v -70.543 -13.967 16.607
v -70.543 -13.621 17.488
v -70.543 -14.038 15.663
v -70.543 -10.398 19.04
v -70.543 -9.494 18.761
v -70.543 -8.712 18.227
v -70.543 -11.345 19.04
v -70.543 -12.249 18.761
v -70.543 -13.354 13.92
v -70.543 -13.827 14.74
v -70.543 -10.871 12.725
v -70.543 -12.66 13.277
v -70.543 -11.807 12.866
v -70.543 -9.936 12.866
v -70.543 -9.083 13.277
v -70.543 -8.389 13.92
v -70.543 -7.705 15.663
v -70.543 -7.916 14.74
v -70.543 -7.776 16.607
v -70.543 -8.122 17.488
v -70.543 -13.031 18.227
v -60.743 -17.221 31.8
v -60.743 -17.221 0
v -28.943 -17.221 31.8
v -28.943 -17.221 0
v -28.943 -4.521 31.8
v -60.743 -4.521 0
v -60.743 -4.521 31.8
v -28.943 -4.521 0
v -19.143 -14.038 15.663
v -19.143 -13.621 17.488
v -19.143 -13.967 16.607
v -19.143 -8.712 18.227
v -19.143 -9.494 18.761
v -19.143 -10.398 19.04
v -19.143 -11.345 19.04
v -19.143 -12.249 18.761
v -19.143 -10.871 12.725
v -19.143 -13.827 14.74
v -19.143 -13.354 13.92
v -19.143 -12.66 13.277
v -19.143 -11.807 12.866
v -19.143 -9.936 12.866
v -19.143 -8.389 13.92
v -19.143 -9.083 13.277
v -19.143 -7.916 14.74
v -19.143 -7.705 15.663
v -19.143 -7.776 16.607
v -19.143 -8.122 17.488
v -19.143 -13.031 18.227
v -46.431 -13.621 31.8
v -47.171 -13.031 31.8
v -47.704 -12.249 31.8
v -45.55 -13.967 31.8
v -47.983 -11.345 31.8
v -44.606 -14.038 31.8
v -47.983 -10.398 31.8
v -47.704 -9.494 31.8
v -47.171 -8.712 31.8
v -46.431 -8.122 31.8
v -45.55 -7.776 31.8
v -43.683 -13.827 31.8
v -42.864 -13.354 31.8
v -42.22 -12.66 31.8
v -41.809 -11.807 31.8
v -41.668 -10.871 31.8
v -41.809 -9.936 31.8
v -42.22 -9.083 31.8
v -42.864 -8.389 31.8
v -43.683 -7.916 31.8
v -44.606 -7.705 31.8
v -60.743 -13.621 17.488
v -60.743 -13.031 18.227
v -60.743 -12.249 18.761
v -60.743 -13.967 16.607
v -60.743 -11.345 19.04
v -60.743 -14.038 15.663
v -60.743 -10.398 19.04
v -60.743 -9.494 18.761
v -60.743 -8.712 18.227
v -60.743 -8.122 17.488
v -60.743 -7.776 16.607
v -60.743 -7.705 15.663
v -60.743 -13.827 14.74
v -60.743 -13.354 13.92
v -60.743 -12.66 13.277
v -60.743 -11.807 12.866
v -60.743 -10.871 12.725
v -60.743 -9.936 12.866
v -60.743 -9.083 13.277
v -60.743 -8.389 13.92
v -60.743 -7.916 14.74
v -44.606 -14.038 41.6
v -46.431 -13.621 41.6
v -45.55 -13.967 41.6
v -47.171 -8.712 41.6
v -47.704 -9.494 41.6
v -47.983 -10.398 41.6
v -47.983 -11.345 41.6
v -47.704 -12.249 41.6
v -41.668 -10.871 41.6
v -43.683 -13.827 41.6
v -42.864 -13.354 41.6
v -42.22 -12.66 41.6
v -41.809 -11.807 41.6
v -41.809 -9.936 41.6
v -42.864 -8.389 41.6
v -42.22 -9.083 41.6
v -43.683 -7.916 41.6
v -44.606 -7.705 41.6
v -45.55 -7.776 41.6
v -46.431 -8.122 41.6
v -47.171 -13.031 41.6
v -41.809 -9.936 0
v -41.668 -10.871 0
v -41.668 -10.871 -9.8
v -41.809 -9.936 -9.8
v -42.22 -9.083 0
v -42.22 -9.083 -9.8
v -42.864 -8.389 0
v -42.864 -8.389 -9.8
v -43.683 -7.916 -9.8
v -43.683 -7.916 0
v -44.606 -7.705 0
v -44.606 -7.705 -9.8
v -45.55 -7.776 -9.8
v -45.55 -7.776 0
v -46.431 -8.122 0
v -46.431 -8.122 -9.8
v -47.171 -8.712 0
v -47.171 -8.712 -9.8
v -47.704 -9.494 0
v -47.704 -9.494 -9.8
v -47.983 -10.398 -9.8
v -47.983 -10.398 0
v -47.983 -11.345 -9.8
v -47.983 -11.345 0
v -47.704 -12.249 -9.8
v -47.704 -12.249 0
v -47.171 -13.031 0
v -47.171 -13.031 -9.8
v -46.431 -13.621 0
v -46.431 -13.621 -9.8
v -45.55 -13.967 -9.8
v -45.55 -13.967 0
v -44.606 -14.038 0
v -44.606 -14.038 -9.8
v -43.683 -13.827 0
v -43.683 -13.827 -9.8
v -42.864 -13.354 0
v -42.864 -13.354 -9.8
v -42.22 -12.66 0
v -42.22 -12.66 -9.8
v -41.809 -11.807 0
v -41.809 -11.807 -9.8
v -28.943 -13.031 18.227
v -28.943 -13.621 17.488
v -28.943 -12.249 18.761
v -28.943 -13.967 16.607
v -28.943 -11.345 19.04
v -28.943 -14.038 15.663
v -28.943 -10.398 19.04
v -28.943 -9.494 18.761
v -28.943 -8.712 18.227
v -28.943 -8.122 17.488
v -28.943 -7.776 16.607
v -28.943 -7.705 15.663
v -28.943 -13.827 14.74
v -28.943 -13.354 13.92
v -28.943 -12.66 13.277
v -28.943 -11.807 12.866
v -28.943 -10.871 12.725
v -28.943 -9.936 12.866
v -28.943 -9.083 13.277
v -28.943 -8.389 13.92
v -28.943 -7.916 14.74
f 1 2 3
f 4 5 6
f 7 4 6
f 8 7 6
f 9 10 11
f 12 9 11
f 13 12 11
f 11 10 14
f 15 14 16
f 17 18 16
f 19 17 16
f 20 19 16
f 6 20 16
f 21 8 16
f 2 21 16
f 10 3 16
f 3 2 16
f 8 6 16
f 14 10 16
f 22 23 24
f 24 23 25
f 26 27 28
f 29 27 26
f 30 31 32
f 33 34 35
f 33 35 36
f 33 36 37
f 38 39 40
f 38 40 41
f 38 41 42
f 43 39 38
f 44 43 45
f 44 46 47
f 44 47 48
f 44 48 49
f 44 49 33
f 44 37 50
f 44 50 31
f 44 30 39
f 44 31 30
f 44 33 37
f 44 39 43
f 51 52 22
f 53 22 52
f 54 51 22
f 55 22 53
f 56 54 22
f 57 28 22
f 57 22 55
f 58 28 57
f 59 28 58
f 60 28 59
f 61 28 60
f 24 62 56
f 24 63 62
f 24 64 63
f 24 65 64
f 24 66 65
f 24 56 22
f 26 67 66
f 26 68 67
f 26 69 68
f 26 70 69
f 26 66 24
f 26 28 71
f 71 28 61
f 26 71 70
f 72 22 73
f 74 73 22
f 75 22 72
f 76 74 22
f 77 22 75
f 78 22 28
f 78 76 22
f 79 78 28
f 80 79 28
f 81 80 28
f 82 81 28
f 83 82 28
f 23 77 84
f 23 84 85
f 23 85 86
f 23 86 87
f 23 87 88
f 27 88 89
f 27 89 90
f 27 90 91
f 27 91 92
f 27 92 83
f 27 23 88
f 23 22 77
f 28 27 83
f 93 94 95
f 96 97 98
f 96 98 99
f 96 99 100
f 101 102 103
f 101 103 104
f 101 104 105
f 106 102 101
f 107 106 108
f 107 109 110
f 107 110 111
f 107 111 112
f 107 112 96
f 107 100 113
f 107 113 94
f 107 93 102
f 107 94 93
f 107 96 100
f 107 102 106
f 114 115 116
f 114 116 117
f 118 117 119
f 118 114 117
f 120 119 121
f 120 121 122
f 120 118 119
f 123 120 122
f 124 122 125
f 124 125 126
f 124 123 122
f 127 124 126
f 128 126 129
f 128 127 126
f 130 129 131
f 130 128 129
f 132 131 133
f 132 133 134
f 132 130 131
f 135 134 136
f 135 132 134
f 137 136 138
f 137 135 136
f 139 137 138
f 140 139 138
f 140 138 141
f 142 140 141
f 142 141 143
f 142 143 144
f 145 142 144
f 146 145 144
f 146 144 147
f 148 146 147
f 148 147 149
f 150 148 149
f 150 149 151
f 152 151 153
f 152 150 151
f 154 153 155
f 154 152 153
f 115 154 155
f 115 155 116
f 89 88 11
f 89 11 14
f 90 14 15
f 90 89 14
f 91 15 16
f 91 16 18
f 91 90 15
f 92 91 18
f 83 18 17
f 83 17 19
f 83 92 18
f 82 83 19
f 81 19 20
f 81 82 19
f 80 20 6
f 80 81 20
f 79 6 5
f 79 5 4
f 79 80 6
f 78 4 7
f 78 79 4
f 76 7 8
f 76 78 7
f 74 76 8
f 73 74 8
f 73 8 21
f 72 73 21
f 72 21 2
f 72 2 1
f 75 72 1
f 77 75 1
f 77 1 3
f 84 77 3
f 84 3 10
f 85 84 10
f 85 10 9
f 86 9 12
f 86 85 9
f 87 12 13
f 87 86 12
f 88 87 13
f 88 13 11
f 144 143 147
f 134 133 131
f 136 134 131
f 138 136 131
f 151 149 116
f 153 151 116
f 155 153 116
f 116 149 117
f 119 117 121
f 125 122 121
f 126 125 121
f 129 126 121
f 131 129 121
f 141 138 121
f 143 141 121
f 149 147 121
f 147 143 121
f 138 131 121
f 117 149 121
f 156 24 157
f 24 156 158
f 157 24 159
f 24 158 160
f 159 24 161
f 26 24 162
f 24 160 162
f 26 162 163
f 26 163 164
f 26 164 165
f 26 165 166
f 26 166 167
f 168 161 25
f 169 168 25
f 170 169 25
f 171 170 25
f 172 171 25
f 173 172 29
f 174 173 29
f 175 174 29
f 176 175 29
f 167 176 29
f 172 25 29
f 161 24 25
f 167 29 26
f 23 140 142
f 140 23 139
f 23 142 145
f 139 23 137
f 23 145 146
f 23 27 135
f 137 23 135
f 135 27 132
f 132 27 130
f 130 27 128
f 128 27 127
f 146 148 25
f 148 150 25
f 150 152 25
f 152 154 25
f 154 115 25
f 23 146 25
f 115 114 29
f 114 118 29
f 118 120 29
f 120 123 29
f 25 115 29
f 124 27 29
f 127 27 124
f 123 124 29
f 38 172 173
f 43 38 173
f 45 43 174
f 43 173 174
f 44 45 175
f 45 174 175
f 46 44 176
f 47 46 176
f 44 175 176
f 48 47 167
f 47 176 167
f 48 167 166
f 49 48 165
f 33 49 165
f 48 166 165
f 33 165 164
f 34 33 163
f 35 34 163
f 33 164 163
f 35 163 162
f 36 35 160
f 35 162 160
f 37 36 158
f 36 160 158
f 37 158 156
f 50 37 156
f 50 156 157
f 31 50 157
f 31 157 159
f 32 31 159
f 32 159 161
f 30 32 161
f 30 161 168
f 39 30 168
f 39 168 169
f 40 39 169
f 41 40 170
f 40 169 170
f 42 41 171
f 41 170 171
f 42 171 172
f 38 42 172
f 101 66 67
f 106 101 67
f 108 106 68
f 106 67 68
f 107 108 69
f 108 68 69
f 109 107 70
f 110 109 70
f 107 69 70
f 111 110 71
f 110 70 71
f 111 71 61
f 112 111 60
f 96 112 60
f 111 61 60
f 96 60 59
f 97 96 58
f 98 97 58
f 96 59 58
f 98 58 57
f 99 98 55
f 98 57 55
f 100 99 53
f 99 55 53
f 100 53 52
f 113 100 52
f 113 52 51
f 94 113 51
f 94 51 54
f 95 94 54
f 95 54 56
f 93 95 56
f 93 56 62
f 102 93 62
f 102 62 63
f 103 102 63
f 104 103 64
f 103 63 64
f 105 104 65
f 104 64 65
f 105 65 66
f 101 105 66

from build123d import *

# Parameters (mm, degrees)
SKETCH5_W           = 31.8
SKETCH5_H           = 12.7
BOSS_EXTRUDE4_DEPTH = 31.8
SKETCH6_R           = 3.175
BOSS_EXTRUDE5_DEPTH = 9.8
SKETCH10_R          = 3.175
BOSS_EXTRUDE6_DEPTH = 9.8


with BuildPart() as part:
    # Sketch5 → Boss-Extrude4 (new body)
    with BuildSketch(Plane.XY):
        with Locations((-44.843150914, -10.871383787)):
            Rectangle(SKETCH5_W, SKETCH5_H)
    extrude(amount=BOSS_EXTRUDE4_DEPTH)

    # Sketch6 → Boss-Extrude5 (add)
    with BuildSketch(Plane.XY.offset(31.8)):
        with Locations((-44.843150914, -10.871383787)):
            Circle(SKETCH6_R)
    boss_extrude5 = extrude(amount=BOSS_EXTRUDE5_DEPTH)

    # Mirror1: Boss-Extrude5 across plane
    add(boss_extrude5.mirror(Plane.XY.offset(15.9)))

    # Sketch10 → Boss-Extrude6 (add)
    with BuildSketch(Plane(origin=(-28.943150914, 0, 0), x_dir=(0, 0, -1), z_dir=(1, 0, 0))):
        with Locations((-15.9, -10.871383787)):
            Circle(SKETCH10_R)
    boss_extrude6 = extrude(amount=BOSS_EXTRUDE6_DEPTH)

    # Mirror2: Boss-Extrude6 across plane
    add(boss_extrude6.mirror(Plane(origin=(-44.843150914, 0, 0), x_dir=(0, 0, 1), z_dir=(1, 0, 0))))


solid = part.part
